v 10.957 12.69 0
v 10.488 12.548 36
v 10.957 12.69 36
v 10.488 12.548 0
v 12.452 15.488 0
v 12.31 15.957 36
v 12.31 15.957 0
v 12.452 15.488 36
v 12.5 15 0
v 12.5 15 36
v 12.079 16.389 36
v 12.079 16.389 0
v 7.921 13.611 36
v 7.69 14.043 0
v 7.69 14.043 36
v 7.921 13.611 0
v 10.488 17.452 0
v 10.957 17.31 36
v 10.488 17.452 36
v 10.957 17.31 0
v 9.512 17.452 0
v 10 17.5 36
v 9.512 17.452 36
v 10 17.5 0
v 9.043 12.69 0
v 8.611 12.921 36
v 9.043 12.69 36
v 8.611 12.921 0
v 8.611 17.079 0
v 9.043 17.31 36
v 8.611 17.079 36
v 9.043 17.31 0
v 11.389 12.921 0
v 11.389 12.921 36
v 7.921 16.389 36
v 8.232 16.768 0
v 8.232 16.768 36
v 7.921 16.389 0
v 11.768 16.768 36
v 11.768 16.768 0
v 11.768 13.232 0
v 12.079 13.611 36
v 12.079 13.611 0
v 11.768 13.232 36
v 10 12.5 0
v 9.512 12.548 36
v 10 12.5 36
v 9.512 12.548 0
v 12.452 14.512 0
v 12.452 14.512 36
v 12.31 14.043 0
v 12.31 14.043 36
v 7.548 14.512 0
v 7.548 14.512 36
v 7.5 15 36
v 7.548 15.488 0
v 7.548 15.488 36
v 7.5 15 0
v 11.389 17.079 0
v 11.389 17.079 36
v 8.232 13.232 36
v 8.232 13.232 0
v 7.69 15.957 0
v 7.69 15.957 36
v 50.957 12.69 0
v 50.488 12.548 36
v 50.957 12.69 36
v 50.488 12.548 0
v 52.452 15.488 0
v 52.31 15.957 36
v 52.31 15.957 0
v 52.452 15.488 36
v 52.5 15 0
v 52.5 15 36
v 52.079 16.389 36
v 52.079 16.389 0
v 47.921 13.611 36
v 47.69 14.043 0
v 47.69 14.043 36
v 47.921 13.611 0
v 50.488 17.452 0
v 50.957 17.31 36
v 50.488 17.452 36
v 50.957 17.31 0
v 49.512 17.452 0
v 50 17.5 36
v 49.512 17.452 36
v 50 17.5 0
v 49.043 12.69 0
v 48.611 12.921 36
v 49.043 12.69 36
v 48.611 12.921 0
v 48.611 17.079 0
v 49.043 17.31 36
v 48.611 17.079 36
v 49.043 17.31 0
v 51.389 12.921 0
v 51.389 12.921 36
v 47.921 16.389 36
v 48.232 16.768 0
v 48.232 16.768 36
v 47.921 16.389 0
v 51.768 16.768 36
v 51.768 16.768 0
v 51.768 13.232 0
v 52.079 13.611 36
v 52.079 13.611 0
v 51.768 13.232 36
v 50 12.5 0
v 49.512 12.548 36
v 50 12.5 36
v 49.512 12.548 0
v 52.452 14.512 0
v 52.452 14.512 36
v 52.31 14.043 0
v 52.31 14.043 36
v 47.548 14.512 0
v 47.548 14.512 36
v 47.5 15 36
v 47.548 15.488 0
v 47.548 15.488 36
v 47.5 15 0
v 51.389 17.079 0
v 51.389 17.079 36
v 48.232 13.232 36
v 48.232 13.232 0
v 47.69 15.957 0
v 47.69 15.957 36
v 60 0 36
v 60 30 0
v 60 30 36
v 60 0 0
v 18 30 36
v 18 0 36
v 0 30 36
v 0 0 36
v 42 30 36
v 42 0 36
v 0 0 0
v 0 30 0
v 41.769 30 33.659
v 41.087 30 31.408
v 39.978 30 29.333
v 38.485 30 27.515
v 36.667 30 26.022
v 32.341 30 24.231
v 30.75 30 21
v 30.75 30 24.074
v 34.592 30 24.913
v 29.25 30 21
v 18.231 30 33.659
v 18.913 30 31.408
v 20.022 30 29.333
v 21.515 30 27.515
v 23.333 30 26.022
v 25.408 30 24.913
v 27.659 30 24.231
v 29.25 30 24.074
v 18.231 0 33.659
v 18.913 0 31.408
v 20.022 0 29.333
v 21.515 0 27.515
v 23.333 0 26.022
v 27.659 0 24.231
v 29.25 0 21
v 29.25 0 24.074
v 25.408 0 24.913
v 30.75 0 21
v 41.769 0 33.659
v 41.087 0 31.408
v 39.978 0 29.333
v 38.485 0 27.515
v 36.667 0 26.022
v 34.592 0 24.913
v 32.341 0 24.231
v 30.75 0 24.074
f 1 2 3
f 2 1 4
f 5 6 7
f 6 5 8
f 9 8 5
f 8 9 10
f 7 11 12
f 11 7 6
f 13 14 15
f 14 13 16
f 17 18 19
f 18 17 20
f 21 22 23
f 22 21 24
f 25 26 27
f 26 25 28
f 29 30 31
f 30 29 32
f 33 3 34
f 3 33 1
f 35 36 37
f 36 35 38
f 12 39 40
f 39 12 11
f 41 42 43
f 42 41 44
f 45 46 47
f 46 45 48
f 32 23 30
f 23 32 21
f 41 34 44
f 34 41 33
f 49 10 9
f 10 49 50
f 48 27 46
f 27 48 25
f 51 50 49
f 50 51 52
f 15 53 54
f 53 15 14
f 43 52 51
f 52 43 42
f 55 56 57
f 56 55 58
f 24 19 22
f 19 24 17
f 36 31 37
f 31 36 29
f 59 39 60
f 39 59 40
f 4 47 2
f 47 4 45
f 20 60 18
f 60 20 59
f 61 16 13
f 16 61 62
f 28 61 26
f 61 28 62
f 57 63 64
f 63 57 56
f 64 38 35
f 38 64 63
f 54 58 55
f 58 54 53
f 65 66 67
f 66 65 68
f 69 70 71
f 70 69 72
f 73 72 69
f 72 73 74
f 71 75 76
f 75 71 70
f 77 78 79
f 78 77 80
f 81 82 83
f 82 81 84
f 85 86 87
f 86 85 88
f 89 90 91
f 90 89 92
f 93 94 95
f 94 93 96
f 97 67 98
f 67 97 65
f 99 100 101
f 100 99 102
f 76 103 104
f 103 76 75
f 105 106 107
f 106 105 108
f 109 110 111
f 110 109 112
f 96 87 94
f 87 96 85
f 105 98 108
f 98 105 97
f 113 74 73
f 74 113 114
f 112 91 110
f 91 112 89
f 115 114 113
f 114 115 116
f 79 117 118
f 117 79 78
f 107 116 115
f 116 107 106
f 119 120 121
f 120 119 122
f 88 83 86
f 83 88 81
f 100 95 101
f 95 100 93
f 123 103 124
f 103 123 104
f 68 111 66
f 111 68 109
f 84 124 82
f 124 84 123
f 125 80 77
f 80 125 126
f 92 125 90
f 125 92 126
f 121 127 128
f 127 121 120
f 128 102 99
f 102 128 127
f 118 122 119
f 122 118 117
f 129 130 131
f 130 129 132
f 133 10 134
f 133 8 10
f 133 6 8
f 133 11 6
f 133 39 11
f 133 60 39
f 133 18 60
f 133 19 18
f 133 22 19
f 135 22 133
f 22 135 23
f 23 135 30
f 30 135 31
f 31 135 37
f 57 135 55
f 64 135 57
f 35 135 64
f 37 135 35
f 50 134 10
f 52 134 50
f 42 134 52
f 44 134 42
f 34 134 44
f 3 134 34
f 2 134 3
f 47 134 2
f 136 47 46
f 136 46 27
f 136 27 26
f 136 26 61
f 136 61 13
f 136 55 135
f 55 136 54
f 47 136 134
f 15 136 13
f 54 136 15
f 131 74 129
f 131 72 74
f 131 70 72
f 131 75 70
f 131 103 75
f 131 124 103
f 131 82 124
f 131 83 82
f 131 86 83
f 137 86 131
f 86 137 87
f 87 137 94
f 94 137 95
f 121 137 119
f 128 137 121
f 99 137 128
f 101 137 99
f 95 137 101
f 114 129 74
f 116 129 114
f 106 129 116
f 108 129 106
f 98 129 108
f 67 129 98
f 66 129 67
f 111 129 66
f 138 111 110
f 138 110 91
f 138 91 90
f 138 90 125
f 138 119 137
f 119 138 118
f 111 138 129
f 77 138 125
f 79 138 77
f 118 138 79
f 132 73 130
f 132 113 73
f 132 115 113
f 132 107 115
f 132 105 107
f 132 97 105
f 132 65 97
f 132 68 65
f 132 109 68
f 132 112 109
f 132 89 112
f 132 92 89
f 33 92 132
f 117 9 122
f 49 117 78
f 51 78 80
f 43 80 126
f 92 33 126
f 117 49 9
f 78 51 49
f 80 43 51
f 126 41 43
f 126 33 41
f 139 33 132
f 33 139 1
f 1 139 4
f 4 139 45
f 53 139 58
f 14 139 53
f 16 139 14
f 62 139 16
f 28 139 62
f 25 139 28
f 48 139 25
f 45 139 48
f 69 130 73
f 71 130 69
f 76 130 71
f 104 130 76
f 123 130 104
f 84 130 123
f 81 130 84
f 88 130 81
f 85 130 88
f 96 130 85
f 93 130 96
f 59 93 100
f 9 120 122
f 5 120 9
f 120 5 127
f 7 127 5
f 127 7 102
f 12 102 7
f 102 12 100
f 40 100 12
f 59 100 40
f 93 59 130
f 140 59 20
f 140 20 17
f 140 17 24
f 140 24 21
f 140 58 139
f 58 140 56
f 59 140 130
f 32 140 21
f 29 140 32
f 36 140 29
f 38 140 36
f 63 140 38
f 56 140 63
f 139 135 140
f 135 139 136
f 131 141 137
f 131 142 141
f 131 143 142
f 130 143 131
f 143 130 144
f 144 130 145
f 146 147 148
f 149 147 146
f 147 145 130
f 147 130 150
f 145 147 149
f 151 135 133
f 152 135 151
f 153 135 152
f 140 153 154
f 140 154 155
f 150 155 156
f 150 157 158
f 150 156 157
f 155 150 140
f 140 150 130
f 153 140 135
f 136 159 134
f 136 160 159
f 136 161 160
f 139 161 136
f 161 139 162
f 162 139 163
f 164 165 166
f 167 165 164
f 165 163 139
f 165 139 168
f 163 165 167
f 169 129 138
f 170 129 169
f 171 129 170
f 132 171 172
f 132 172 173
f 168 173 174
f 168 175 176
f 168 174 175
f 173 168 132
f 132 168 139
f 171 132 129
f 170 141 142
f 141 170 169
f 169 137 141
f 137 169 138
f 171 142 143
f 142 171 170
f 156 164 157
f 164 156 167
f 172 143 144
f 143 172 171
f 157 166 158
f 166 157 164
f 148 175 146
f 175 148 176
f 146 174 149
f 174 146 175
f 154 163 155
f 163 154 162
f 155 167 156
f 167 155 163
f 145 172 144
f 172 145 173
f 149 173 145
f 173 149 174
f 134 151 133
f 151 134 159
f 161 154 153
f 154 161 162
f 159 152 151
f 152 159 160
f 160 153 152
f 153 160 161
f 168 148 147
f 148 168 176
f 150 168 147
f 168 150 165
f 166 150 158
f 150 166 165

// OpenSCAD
$fn = 32;

// ----------------------------------------------------------------------
// Saddle clamp: split shaft clamp
// ----------------------------------------------------------------------

// --- parameters (mm) ---
blk_l = 60;               // block length, X
blk_w = 30;               // block width, Y
blk_h = 36;               // block height
clamp_r = 12;             // shaft groove radius
hole_r = 2.5;             // bolt hole radius
hole_m = 10;              // bolt hole margin from the ends
saw_w = 1.5;              // saw kerf width

saw_depth = clamp_r + 3;  // saw kerf depth

difference() {
  cube([blk_l, blk_w, blk_h]);
  translate([blk_l / 2, -1, blk_h])
    rotate([-90, 0, 0])
      cylinder(h = blk_w + 2, r = clamp_r);
  for (sx = [0, 1])
    translate([sx ? blk_l - hole_m : hole_m, blk_w / 2, -1])
      cylinder(r = hole_r, h = blk_h + 2);
  translate([blk_l / 2 - saw_w / 2, -1, blk_h - saw_depth])
    cube([saw_w, blk_w + 2, saw_depth + 1]);
}
